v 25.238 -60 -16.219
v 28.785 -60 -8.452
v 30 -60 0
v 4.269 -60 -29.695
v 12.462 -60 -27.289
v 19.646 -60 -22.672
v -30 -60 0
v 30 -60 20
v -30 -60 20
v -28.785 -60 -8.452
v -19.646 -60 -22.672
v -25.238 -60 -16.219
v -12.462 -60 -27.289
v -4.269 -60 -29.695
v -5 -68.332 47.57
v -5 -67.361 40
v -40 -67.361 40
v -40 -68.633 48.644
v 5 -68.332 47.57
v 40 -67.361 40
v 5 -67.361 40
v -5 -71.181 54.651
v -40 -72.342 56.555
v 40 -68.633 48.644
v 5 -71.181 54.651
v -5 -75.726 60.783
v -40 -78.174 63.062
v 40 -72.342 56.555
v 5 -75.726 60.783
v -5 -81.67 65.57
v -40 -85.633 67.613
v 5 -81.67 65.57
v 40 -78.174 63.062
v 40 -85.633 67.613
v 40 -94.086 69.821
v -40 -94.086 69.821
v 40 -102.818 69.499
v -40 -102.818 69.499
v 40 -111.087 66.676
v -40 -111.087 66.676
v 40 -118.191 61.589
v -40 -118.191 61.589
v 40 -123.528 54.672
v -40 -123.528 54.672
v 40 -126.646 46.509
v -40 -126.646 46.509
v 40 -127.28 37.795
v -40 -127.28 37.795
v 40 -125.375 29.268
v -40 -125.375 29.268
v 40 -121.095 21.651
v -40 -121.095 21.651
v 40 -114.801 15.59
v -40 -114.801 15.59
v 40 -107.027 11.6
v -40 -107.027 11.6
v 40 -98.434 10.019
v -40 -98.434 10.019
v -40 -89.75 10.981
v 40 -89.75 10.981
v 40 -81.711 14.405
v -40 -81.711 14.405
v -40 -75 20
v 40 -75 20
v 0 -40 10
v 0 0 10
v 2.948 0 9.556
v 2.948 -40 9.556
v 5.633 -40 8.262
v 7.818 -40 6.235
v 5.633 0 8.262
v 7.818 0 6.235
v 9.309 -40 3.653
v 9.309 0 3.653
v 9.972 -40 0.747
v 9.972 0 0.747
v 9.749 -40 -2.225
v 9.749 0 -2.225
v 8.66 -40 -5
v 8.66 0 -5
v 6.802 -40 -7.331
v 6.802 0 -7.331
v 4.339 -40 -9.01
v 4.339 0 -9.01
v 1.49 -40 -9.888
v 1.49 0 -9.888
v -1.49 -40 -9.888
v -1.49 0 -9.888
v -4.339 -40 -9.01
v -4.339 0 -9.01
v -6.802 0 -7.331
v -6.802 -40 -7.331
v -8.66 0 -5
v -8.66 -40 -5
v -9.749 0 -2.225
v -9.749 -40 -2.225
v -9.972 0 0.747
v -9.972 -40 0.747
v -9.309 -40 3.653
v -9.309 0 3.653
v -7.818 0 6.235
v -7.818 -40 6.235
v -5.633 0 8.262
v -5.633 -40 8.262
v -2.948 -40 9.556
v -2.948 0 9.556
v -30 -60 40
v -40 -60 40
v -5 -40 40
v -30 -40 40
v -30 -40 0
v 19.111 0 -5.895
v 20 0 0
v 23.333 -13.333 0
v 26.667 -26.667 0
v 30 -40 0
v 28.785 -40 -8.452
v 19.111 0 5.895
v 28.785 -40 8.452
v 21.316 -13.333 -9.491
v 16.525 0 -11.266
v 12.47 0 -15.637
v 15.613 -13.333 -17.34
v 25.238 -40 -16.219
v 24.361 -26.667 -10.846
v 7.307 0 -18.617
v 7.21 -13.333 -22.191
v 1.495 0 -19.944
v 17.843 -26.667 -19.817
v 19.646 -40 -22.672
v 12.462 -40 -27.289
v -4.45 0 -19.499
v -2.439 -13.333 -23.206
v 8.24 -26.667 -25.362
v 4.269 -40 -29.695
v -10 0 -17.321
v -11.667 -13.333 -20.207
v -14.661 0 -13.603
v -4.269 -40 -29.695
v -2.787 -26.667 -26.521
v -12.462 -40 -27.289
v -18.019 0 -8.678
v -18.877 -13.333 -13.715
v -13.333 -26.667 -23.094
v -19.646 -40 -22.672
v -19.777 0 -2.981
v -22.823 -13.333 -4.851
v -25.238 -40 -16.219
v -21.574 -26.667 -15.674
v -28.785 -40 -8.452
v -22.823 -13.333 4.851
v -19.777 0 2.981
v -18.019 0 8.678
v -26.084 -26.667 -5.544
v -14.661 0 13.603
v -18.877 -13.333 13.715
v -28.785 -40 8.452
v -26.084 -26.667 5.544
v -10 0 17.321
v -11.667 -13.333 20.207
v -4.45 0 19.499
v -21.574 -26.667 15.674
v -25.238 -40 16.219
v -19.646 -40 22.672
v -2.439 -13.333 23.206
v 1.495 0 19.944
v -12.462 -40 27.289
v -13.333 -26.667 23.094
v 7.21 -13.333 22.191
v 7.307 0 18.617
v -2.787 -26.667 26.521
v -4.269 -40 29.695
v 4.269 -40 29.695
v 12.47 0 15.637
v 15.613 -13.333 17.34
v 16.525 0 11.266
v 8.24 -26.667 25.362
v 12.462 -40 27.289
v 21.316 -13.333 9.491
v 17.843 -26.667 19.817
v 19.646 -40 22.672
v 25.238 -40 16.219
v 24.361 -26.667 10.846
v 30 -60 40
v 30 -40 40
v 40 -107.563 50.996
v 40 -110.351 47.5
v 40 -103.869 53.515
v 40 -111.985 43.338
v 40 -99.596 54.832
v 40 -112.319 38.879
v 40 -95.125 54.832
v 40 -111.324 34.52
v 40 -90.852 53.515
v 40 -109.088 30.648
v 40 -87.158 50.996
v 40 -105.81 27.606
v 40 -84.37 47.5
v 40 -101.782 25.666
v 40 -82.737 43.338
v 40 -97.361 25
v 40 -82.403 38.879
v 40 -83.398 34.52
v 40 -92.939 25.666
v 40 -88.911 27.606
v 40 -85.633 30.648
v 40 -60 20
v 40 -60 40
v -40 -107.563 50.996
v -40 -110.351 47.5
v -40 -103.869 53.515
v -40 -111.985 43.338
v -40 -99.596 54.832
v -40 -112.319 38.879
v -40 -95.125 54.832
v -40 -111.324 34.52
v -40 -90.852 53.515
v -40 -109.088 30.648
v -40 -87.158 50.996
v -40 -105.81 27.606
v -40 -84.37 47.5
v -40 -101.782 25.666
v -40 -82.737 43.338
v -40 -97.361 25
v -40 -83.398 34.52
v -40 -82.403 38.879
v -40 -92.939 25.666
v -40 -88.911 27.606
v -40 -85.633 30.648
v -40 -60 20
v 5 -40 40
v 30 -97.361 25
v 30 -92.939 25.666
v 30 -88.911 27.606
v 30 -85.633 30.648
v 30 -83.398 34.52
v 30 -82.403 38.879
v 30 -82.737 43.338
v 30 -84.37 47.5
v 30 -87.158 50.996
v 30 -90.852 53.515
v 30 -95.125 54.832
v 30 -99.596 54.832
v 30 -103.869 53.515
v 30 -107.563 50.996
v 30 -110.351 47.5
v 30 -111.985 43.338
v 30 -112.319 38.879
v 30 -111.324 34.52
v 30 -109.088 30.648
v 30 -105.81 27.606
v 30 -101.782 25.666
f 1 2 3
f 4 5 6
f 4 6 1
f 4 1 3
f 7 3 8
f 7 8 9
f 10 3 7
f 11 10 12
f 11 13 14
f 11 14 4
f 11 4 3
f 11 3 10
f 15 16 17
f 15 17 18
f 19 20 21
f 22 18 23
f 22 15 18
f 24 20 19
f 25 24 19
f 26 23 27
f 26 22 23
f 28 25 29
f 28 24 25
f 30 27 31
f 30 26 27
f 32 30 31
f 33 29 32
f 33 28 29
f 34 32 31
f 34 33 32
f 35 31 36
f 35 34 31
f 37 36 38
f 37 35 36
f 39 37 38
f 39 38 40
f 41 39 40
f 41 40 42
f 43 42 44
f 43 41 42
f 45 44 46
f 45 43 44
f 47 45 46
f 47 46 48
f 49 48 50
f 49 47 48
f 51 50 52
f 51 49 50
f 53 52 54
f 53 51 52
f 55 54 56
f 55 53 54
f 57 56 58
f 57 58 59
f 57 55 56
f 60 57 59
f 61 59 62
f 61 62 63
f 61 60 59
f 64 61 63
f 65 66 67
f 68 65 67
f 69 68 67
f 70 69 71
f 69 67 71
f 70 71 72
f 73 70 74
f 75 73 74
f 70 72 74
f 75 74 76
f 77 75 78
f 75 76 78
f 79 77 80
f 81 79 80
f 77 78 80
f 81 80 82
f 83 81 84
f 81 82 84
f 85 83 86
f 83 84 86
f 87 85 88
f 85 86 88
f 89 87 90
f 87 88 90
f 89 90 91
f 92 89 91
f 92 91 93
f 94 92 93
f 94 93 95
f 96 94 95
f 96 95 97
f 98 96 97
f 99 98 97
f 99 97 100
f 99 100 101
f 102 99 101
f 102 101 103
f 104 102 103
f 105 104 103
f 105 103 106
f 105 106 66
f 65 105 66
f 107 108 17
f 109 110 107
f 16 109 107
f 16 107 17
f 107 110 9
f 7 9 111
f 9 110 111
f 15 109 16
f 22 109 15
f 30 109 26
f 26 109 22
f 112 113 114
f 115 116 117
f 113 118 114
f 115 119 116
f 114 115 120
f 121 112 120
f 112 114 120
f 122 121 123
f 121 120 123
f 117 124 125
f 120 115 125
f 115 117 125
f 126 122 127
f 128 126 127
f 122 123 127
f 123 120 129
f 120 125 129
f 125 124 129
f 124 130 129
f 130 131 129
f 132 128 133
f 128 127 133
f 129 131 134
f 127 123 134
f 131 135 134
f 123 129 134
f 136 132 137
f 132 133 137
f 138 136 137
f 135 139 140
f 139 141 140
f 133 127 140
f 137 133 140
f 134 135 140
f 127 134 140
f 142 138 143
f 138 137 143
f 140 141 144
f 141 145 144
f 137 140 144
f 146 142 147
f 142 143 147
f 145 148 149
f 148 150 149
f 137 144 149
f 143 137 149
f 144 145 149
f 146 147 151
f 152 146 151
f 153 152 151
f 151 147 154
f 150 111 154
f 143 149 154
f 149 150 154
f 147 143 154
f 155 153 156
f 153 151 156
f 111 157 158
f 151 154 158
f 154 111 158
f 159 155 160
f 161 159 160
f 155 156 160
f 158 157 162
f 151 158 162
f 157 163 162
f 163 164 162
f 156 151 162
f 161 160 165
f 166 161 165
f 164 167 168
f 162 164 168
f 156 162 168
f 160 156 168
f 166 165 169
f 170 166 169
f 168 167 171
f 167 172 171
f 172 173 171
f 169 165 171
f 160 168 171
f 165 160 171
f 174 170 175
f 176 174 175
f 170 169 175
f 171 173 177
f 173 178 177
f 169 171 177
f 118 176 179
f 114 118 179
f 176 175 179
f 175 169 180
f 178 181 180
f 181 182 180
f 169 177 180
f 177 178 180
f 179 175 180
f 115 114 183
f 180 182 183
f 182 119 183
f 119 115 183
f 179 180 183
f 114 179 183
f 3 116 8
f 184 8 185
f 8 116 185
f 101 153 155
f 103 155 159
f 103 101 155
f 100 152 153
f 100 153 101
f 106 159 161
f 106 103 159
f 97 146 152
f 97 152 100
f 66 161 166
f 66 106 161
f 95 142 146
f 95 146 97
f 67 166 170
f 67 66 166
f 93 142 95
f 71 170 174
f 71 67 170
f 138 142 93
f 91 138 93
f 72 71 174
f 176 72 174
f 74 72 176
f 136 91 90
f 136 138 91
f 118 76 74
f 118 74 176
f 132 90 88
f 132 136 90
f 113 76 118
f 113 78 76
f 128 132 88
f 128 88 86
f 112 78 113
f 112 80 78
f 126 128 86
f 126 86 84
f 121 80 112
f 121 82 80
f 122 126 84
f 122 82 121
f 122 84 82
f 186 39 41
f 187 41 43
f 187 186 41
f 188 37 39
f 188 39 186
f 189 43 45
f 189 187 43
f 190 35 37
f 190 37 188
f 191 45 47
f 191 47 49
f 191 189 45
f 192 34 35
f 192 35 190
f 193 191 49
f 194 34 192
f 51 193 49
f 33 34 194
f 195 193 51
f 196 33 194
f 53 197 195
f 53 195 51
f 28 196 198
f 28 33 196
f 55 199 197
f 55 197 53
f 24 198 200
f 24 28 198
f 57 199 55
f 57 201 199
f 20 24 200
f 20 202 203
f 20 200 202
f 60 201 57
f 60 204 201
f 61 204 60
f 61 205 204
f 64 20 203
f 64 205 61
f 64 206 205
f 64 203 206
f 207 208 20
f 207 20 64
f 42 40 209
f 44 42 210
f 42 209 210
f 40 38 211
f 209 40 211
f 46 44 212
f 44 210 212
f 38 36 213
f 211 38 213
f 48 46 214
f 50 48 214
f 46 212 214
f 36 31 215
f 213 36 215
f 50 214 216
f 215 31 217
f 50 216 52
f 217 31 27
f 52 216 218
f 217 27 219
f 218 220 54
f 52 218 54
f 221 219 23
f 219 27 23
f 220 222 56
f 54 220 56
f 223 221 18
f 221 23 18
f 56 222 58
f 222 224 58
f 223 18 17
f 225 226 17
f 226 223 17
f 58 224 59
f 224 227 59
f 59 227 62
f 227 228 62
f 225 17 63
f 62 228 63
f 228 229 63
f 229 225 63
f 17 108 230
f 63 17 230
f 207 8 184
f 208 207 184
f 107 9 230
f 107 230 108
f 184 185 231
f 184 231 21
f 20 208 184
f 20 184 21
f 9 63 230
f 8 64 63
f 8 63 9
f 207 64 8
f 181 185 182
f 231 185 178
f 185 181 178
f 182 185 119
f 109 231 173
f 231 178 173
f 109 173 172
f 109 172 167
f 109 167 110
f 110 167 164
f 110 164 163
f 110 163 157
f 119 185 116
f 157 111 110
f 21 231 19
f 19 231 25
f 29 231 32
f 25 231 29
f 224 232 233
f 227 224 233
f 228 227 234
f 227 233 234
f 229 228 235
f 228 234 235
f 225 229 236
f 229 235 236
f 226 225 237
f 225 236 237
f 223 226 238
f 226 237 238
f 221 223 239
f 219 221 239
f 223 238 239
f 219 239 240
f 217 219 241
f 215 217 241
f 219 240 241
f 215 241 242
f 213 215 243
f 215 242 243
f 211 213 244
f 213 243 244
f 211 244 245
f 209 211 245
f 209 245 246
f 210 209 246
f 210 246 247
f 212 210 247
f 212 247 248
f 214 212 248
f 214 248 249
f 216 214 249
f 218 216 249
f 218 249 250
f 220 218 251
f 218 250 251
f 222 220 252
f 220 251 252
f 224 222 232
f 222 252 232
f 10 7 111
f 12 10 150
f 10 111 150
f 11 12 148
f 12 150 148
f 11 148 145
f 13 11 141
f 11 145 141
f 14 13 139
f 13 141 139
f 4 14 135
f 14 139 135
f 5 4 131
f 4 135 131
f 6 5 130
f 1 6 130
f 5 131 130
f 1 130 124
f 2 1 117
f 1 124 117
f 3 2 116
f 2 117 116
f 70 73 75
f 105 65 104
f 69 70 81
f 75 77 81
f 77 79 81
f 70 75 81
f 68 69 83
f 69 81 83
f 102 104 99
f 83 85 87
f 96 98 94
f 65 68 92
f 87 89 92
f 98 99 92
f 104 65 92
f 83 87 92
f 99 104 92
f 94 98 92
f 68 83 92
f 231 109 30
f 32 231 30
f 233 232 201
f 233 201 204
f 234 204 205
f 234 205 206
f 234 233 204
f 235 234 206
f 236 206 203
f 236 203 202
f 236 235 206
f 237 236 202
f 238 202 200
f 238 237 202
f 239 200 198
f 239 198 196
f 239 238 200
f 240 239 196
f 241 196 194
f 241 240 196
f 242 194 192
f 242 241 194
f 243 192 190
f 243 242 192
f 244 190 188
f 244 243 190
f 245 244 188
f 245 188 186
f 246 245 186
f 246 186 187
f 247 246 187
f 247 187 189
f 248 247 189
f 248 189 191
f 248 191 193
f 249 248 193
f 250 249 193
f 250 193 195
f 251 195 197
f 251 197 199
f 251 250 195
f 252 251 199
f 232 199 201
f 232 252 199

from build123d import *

# Parameters (mm, degrees)
SKETCH1_R                = 20
SKETCH2_R                = 30
SKETCH3_R                = 10
CUT_EXTRUDE1_DEPTH       = 59.30951912
BOSS_EXTRUDE1_DEPTH      = 20
SKETCH7_R                = 30
SKETCH7_R_2              = 15
BOSS_EXTRUDE2_DEPTH      = 10
BOSS_EXTRUDE2_DEPTH_BACK = 70
RIB1_REACH               = 152.734
SKETCH11_WALL_W          = 352.358184706
SKETCH11_WALL_H          = 10


with BuildPart() as part:
    # Sketch1 → Loft1 section 0
    with BuildSketch(Plane(origin=(0, 0, 0), x_dir=(1, 0, 0), z_dir=(0, 1, 0))):
        Circle(SKETCH1_R)
    # Sketch2 → Loft1 section 1
    with BuildSketch(Plane(origin=(0, -40, 0), x_dir=(1, 0, 0), z_dir=(0, 1, 0))):
        Circle(SKETCH2_R)
    loft()

    # Sketch3 → Cut-Extrude1 (cut, through all)
    with BuildSketch(Plane(origin=(0, 0, 0), x_dir=(1, 0, 0), z_dir=(0, 1, 0))):
        with Locations(Location((0, 0, 0), (0, 0, 270))):
            Circle(SKETCH3_R)
    extrude(amount=-CUT_EXTRUDE1_DEPTH, mode=Mode.SUBTRACT)

    # Sketch6 → Boss-Extrude1 (add)
    with BuildSketch(Plane(origin=(0, -40, 0), x_dir=(1, 0, 0), z_dir=(0, 1, 0))):
        with BuildLine():
            ThreePointArc((-30, 0), (0, 30), (30, 0))
            Line((30, 0), (30, -40))
            Line((30, -40), (-30, -40))
            Line((-30, -40), (-30, 0))
        make_face()
    extrude(amount=-BOSS_EXTRUDE1_DEPTH)

    # Sketch7 → Boss-Extrude2 (add, two sides)
    with BuildSketch(Plane(origin=(30, 0, 0), x_dir=(0, 0, -1), z_dir=(1, 0, 0))) as boss_extrude2_sk:
        with Locations((-40, -97.360679775)):
            Circle(SKETCH7_R)
        with Locations((-40, -97.360679775)):
            Circle(SKETCH7_R_2, mode=Mode.SUBTRACT)
        with BuildLine():
            Line((-20, -75), (-20, -60))
            Line((-20, -60), (-40, -60))
            Line((-40, -60), (-40, -67.360679775))
            ThreePointArc((-40, -67.360679775), (-29.295337307, -69.335509006), (-20, -75))
        make_face()
    extrude(amount=BOSS_EXTRUDE2_DEPTH)
    extrude(boss_extrude2_sk.sketch, amount=-BOSS_EXTRUDE2_DEPTH_BACK)

    # Sketch11 wall → Rib1 (add, up to next)
    with BuildSketch(Plane(origin=(0, -60.835244504, 52.784931695), x_dir=(0, -0.85232878253, 0.52300635414), z_dir=(0, -0.52300635414, -0.85232878253)), mode=Mode.PRIVATE) as rib1_sk1:
        Rectangle(SKETCH11_WALL_W, SKETCH11_WALL_H)
    rib1_tool1 = extrude(rib1_sk1.sketch, amount=RIB1_REACH, mode=Mode.PRIVATE) - part.part
    add(rib1_tool1.solids().sort_by_distance((0, -60.835244504, 52.784931695))[0])


solid = part.part
